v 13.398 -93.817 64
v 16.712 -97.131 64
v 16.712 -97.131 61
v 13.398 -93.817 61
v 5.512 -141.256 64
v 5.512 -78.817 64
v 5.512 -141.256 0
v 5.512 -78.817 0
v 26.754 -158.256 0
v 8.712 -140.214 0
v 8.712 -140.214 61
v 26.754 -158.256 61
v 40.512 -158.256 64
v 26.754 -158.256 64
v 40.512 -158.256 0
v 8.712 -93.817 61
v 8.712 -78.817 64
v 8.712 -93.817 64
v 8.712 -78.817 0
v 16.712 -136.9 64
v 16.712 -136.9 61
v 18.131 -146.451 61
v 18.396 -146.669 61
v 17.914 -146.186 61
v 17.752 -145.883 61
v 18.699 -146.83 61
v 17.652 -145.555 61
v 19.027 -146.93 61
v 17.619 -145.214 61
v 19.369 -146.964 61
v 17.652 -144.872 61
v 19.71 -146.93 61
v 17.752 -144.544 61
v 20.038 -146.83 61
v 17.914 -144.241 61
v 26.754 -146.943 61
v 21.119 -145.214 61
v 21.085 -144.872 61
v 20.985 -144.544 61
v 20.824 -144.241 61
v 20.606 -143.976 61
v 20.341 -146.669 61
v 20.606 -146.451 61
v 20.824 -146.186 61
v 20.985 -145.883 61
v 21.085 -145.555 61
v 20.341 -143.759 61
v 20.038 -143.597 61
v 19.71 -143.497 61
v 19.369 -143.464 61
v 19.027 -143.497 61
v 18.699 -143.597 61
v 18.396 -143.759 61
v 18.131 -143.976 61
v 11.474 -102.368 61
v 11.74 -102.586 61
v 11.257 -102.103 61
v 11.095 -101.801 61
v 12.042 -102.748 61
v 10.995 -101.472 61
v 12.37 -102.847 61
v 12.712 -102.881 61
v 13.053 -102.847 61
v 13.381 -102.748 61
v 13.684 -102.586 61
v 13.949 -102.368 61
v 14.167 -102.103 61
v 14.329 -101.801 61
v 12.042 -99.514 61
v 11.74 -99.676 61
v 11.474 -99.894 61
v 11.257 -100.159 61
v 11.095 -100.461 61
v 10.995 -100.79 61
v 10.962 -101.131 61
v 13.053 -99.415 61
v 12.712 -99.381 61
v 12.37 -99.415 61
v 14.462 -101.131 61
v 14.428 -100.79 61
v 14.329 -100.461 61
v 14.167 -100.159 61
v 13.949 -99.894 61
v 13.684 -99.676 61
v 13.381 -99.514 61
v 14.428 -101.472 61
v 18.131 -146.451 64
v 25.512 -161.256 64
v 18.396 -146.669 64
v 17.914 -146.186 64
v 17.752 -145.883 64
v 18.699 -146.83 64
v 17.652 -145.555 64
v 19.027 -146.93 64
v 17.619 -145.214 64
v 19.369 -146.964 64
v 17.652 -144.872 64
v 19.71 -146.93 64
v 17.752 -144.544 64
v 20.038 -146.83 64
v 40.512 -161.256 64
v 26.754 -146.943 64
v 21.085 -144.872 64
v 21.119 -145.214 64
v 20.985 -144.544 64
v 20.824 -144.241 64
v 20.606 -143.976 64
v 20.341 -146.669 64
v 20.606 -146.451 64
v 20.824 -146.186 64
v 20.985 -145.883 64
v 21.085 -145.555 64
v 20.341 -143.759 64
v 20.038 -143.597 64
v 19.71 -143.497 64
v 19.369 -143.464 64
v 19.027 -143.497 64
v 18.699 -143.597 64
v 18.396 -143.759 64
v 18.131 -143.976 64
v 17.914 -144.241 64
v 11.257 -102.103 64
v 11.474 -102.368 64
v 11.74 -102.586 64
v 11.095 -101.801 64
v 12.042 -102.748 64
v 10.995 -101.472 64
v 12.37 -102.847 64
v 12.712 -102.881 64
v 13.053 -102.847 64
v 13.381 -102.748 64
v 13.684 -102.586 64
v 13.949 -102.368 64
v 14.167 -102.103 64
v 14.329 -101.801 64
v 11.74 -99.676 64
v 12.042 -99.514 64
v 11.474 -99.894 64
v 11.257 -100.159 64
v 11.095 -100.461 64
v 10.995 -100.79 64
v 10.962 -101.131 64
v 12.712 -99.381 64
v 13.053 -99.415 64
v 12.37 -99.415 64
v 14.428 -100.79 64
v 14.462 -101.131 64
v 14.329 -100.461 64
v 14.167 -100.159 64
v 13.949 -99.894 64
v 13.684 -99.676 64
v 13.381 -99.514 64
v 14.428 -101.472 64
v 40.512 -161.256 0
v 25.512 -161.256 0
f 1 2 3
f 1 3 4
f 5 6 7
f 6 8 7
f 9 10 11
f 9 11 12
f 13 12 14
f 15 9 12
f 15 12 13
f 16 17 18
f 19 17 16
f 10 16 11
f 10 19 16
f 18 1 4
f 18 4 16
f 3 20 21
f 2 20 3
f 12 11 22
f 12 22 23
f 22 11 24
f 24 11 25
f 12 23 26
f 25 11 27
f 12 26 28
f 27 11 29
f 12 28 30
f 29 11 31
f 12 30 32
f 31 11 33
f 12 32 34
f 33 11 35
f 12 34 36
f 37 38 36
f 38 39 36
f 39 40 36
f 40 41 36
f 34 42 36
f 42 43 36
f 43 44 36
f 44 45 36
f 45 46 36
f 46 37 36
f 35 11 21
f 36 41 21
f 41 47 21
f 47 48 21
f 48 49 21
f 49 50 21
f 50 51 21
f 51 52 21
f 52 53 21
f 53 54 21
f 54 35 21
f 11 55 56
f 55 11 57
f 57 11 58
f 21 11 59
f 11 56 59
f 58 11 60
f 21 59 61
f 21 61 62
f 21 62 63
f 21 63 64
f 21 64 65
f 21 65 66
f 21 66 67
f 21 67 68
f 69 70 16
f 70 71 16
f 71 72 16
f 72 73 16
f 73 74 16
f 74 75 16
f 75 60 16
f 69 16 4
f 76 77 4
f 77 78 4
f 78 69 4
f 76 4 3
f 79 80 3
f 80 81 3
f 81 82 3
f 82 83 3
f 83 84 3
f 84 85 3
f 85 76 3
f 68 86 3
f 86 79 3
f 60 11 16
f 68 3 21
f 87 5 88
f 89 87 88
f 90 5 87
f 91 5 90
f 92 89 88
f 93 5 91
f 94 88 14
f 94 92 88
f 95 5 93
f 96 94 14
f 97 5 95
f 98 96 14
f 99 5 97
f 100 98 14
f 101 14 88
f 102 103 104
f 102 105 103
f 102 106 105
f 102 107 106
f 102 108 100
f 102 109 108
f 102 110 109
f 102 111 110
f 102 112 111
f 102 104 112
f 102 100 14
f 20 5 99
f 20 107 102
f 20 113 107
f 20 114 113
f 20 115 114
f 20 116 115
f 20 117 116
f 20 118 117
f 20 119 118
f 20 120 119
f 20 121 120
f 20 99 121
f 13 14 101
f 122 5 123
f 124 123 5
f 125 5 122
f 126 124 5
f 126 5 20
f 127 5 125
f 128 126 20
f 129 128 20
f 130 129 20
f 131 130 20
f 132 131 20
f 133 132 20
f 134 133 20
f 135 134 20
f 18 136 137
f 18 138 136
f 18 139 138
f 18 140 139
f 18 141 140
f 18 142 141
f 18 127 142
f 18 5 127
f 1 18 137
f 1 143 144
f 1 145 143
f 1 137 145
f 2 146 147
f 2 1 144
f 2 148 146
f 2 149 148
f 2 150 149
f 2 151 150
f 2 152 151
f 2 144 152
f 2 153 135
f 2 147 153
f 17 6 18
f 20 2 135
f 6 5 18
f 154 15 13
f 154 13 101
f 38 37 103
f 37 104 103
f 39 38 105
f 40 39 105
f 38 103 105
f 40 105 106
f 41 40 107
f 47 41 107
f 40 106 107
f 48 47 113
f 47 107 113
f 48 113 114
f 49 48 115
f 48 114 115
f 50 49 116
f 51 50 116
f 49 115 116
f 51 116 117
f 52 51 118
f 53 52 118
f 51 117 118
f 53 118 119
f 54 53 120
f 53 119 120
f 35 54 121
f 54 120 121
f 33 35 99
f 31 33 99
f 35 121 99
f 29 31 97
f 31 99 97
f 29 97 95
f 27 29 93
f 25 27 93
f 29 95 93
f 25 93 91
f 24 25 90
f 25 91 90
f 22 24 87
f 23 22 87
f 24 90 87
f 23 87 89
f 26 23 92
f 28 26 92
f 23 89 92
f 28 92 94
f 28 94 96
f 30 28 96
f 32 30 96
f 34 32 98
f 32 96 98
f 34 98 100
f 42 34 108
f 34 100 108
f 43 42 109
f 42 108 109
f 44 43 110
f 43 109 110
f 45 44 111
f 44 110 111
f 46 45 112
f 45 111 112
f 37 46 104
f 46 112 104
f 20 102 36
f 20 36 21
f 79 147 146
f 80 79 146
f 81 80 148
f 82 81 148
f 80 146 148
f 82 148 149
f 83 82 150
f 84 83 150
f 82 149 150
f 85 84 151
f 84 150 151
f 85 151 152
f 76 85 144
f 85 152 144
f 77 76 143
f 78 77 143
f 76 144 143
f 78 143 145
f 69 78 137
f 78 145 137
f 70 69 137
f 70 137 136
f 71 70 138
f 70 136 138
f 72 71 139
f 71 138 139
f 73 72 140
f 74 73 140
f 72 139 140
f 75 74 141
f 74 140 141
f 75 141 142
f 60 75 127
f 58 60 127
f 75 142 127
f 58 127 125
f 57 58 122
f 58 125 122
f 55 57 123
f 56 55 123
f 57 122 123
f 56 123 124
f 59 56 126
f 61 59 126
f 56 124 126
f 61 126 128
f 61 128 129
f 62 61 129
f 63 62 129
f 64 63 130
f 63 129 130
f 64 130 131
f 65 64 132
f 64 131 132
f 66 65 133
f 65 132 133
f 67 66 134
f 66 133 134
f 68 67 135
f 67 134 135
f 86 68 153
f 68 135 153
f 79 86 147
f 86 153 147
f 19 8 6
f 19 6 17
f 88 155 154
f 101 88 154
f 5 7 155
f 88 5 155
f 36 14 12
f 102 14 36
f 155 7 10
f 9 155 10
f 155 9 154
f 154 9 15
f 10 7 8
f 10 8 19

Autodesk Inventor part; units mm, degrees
ref_plane "YZ Plane" through (0, 0, 0) normal (1, 0, 0) x (0, 1, 0)
ref_plane "XZ Plane" through (0, 0, 0) normal (0, 1, 0) x (-1, 0, 0)
ref_plane "XY Plane" through (0, 0, 0) normal (0, 0, 1) x (1, 0, 0)
sketch "Sketch1" plane through (0, 0, 0) normal (0, 0, 1) x (1, 0, 0)
  line L0 (8.7118, -48.8173) -> (8.7118, -78.8173) projected
  line L1 (5.5118, -78.8173) -> (8.7118, -78.8173) projected
  line L2 (5.5118, 131.1827) -> (5.5118, -108.8173) projected
  line L3 (5.5118, 131.1827) -> (5.5118, -141.2563) projected
  line L4 (5.5118, -141.2563) -> (25.5118, -161.2563) projected
  line L5 (25.5118, -161.2563) -> (40.5118, -161.2563) projected
  line L6 (14.7118, -45.3532) -> (8.7118, -48.8173) projected
  line L7 (14.7118, -35.3532) -> (14.7118, -45.3532) projected
  circle A0 centre (11.7118, -40.3532) radius 1.85 projected
  line L8 (8.7118, -31.8891) -> (14.7118, -35.3532) projected
  line L9 (8.7118, -78.8173) -> (8.7118, -140.2136)
  line L10 (8.7118, -140.2136) -> (26.7544, -158.2563)
  line L11 (26.7544, -158.2563) -> (40.5118, -158.2563)
  line L12 (40.5118, -158.2563) -> (40.5118, -161.2563)
  point P0 (0, 0)
  point P1 (33.0118, -161.2563)
  dimension "d0" = 3
  dimension "d1" = 3
extrude "Extrusion1" add sketch "Sketch1" along normal blind 64 contours L1 L9 L10 L11 L12 L5 L4 L3 L2
sketch "Sketch2" plane through (0, 0, 64) normal (0, 0, 1) x (1, 0, 0)
  line L0 (8.7118, -140.2136) -> (8.7118, -78.8173) projected
  line L1 (26.7544, -158.2563) -> (8.7118, -140.2136) projected
  circle A0 centre (12.7118, -101.131) radius 1.75
  circle A1 centre (19.3686, -145.2136) radius 1.75
  line L2 (26.7544, -158.2563) -> (26.7544, -146.9426)
  line L3 (26.7544, -146.9426) -> (16.7118, -136.8999)
  line L4 (16.7118, -136.8999) -> (16.7118, -97.131)
  line L5 (16.7118, -97.131) -> (13.3981, -93.8173)
  line L6 (13.3981, -93.8173) -> (8.7118, -93.8173)
  line L7 (8.7118, -140.2136) -> (8.7118, -78.8173) projected
  point P0 (0, 0)
  dimension "d4" = 4
  dimension "d5" = 4
  dimension "d6" = 3.5
  dimension "d7" = 4
  dimension "d8" = 4
  dimension "d9" = 45
  dimension "d10" = 4
  dimension "d11" = 5
  dimension "d12" = 15
extrude "Extrusion2" add sketch "Sketch2" against normal blind 3
equation "\"d1\" = d0"
equation "\"d5\" = d4"
equation "\"d7\" = d5"
equation "\"d8\" = d7"
equation "\"d10\" = d4"
properties part number "Drag Chain Edge Panel" material "ABS Plastic"
